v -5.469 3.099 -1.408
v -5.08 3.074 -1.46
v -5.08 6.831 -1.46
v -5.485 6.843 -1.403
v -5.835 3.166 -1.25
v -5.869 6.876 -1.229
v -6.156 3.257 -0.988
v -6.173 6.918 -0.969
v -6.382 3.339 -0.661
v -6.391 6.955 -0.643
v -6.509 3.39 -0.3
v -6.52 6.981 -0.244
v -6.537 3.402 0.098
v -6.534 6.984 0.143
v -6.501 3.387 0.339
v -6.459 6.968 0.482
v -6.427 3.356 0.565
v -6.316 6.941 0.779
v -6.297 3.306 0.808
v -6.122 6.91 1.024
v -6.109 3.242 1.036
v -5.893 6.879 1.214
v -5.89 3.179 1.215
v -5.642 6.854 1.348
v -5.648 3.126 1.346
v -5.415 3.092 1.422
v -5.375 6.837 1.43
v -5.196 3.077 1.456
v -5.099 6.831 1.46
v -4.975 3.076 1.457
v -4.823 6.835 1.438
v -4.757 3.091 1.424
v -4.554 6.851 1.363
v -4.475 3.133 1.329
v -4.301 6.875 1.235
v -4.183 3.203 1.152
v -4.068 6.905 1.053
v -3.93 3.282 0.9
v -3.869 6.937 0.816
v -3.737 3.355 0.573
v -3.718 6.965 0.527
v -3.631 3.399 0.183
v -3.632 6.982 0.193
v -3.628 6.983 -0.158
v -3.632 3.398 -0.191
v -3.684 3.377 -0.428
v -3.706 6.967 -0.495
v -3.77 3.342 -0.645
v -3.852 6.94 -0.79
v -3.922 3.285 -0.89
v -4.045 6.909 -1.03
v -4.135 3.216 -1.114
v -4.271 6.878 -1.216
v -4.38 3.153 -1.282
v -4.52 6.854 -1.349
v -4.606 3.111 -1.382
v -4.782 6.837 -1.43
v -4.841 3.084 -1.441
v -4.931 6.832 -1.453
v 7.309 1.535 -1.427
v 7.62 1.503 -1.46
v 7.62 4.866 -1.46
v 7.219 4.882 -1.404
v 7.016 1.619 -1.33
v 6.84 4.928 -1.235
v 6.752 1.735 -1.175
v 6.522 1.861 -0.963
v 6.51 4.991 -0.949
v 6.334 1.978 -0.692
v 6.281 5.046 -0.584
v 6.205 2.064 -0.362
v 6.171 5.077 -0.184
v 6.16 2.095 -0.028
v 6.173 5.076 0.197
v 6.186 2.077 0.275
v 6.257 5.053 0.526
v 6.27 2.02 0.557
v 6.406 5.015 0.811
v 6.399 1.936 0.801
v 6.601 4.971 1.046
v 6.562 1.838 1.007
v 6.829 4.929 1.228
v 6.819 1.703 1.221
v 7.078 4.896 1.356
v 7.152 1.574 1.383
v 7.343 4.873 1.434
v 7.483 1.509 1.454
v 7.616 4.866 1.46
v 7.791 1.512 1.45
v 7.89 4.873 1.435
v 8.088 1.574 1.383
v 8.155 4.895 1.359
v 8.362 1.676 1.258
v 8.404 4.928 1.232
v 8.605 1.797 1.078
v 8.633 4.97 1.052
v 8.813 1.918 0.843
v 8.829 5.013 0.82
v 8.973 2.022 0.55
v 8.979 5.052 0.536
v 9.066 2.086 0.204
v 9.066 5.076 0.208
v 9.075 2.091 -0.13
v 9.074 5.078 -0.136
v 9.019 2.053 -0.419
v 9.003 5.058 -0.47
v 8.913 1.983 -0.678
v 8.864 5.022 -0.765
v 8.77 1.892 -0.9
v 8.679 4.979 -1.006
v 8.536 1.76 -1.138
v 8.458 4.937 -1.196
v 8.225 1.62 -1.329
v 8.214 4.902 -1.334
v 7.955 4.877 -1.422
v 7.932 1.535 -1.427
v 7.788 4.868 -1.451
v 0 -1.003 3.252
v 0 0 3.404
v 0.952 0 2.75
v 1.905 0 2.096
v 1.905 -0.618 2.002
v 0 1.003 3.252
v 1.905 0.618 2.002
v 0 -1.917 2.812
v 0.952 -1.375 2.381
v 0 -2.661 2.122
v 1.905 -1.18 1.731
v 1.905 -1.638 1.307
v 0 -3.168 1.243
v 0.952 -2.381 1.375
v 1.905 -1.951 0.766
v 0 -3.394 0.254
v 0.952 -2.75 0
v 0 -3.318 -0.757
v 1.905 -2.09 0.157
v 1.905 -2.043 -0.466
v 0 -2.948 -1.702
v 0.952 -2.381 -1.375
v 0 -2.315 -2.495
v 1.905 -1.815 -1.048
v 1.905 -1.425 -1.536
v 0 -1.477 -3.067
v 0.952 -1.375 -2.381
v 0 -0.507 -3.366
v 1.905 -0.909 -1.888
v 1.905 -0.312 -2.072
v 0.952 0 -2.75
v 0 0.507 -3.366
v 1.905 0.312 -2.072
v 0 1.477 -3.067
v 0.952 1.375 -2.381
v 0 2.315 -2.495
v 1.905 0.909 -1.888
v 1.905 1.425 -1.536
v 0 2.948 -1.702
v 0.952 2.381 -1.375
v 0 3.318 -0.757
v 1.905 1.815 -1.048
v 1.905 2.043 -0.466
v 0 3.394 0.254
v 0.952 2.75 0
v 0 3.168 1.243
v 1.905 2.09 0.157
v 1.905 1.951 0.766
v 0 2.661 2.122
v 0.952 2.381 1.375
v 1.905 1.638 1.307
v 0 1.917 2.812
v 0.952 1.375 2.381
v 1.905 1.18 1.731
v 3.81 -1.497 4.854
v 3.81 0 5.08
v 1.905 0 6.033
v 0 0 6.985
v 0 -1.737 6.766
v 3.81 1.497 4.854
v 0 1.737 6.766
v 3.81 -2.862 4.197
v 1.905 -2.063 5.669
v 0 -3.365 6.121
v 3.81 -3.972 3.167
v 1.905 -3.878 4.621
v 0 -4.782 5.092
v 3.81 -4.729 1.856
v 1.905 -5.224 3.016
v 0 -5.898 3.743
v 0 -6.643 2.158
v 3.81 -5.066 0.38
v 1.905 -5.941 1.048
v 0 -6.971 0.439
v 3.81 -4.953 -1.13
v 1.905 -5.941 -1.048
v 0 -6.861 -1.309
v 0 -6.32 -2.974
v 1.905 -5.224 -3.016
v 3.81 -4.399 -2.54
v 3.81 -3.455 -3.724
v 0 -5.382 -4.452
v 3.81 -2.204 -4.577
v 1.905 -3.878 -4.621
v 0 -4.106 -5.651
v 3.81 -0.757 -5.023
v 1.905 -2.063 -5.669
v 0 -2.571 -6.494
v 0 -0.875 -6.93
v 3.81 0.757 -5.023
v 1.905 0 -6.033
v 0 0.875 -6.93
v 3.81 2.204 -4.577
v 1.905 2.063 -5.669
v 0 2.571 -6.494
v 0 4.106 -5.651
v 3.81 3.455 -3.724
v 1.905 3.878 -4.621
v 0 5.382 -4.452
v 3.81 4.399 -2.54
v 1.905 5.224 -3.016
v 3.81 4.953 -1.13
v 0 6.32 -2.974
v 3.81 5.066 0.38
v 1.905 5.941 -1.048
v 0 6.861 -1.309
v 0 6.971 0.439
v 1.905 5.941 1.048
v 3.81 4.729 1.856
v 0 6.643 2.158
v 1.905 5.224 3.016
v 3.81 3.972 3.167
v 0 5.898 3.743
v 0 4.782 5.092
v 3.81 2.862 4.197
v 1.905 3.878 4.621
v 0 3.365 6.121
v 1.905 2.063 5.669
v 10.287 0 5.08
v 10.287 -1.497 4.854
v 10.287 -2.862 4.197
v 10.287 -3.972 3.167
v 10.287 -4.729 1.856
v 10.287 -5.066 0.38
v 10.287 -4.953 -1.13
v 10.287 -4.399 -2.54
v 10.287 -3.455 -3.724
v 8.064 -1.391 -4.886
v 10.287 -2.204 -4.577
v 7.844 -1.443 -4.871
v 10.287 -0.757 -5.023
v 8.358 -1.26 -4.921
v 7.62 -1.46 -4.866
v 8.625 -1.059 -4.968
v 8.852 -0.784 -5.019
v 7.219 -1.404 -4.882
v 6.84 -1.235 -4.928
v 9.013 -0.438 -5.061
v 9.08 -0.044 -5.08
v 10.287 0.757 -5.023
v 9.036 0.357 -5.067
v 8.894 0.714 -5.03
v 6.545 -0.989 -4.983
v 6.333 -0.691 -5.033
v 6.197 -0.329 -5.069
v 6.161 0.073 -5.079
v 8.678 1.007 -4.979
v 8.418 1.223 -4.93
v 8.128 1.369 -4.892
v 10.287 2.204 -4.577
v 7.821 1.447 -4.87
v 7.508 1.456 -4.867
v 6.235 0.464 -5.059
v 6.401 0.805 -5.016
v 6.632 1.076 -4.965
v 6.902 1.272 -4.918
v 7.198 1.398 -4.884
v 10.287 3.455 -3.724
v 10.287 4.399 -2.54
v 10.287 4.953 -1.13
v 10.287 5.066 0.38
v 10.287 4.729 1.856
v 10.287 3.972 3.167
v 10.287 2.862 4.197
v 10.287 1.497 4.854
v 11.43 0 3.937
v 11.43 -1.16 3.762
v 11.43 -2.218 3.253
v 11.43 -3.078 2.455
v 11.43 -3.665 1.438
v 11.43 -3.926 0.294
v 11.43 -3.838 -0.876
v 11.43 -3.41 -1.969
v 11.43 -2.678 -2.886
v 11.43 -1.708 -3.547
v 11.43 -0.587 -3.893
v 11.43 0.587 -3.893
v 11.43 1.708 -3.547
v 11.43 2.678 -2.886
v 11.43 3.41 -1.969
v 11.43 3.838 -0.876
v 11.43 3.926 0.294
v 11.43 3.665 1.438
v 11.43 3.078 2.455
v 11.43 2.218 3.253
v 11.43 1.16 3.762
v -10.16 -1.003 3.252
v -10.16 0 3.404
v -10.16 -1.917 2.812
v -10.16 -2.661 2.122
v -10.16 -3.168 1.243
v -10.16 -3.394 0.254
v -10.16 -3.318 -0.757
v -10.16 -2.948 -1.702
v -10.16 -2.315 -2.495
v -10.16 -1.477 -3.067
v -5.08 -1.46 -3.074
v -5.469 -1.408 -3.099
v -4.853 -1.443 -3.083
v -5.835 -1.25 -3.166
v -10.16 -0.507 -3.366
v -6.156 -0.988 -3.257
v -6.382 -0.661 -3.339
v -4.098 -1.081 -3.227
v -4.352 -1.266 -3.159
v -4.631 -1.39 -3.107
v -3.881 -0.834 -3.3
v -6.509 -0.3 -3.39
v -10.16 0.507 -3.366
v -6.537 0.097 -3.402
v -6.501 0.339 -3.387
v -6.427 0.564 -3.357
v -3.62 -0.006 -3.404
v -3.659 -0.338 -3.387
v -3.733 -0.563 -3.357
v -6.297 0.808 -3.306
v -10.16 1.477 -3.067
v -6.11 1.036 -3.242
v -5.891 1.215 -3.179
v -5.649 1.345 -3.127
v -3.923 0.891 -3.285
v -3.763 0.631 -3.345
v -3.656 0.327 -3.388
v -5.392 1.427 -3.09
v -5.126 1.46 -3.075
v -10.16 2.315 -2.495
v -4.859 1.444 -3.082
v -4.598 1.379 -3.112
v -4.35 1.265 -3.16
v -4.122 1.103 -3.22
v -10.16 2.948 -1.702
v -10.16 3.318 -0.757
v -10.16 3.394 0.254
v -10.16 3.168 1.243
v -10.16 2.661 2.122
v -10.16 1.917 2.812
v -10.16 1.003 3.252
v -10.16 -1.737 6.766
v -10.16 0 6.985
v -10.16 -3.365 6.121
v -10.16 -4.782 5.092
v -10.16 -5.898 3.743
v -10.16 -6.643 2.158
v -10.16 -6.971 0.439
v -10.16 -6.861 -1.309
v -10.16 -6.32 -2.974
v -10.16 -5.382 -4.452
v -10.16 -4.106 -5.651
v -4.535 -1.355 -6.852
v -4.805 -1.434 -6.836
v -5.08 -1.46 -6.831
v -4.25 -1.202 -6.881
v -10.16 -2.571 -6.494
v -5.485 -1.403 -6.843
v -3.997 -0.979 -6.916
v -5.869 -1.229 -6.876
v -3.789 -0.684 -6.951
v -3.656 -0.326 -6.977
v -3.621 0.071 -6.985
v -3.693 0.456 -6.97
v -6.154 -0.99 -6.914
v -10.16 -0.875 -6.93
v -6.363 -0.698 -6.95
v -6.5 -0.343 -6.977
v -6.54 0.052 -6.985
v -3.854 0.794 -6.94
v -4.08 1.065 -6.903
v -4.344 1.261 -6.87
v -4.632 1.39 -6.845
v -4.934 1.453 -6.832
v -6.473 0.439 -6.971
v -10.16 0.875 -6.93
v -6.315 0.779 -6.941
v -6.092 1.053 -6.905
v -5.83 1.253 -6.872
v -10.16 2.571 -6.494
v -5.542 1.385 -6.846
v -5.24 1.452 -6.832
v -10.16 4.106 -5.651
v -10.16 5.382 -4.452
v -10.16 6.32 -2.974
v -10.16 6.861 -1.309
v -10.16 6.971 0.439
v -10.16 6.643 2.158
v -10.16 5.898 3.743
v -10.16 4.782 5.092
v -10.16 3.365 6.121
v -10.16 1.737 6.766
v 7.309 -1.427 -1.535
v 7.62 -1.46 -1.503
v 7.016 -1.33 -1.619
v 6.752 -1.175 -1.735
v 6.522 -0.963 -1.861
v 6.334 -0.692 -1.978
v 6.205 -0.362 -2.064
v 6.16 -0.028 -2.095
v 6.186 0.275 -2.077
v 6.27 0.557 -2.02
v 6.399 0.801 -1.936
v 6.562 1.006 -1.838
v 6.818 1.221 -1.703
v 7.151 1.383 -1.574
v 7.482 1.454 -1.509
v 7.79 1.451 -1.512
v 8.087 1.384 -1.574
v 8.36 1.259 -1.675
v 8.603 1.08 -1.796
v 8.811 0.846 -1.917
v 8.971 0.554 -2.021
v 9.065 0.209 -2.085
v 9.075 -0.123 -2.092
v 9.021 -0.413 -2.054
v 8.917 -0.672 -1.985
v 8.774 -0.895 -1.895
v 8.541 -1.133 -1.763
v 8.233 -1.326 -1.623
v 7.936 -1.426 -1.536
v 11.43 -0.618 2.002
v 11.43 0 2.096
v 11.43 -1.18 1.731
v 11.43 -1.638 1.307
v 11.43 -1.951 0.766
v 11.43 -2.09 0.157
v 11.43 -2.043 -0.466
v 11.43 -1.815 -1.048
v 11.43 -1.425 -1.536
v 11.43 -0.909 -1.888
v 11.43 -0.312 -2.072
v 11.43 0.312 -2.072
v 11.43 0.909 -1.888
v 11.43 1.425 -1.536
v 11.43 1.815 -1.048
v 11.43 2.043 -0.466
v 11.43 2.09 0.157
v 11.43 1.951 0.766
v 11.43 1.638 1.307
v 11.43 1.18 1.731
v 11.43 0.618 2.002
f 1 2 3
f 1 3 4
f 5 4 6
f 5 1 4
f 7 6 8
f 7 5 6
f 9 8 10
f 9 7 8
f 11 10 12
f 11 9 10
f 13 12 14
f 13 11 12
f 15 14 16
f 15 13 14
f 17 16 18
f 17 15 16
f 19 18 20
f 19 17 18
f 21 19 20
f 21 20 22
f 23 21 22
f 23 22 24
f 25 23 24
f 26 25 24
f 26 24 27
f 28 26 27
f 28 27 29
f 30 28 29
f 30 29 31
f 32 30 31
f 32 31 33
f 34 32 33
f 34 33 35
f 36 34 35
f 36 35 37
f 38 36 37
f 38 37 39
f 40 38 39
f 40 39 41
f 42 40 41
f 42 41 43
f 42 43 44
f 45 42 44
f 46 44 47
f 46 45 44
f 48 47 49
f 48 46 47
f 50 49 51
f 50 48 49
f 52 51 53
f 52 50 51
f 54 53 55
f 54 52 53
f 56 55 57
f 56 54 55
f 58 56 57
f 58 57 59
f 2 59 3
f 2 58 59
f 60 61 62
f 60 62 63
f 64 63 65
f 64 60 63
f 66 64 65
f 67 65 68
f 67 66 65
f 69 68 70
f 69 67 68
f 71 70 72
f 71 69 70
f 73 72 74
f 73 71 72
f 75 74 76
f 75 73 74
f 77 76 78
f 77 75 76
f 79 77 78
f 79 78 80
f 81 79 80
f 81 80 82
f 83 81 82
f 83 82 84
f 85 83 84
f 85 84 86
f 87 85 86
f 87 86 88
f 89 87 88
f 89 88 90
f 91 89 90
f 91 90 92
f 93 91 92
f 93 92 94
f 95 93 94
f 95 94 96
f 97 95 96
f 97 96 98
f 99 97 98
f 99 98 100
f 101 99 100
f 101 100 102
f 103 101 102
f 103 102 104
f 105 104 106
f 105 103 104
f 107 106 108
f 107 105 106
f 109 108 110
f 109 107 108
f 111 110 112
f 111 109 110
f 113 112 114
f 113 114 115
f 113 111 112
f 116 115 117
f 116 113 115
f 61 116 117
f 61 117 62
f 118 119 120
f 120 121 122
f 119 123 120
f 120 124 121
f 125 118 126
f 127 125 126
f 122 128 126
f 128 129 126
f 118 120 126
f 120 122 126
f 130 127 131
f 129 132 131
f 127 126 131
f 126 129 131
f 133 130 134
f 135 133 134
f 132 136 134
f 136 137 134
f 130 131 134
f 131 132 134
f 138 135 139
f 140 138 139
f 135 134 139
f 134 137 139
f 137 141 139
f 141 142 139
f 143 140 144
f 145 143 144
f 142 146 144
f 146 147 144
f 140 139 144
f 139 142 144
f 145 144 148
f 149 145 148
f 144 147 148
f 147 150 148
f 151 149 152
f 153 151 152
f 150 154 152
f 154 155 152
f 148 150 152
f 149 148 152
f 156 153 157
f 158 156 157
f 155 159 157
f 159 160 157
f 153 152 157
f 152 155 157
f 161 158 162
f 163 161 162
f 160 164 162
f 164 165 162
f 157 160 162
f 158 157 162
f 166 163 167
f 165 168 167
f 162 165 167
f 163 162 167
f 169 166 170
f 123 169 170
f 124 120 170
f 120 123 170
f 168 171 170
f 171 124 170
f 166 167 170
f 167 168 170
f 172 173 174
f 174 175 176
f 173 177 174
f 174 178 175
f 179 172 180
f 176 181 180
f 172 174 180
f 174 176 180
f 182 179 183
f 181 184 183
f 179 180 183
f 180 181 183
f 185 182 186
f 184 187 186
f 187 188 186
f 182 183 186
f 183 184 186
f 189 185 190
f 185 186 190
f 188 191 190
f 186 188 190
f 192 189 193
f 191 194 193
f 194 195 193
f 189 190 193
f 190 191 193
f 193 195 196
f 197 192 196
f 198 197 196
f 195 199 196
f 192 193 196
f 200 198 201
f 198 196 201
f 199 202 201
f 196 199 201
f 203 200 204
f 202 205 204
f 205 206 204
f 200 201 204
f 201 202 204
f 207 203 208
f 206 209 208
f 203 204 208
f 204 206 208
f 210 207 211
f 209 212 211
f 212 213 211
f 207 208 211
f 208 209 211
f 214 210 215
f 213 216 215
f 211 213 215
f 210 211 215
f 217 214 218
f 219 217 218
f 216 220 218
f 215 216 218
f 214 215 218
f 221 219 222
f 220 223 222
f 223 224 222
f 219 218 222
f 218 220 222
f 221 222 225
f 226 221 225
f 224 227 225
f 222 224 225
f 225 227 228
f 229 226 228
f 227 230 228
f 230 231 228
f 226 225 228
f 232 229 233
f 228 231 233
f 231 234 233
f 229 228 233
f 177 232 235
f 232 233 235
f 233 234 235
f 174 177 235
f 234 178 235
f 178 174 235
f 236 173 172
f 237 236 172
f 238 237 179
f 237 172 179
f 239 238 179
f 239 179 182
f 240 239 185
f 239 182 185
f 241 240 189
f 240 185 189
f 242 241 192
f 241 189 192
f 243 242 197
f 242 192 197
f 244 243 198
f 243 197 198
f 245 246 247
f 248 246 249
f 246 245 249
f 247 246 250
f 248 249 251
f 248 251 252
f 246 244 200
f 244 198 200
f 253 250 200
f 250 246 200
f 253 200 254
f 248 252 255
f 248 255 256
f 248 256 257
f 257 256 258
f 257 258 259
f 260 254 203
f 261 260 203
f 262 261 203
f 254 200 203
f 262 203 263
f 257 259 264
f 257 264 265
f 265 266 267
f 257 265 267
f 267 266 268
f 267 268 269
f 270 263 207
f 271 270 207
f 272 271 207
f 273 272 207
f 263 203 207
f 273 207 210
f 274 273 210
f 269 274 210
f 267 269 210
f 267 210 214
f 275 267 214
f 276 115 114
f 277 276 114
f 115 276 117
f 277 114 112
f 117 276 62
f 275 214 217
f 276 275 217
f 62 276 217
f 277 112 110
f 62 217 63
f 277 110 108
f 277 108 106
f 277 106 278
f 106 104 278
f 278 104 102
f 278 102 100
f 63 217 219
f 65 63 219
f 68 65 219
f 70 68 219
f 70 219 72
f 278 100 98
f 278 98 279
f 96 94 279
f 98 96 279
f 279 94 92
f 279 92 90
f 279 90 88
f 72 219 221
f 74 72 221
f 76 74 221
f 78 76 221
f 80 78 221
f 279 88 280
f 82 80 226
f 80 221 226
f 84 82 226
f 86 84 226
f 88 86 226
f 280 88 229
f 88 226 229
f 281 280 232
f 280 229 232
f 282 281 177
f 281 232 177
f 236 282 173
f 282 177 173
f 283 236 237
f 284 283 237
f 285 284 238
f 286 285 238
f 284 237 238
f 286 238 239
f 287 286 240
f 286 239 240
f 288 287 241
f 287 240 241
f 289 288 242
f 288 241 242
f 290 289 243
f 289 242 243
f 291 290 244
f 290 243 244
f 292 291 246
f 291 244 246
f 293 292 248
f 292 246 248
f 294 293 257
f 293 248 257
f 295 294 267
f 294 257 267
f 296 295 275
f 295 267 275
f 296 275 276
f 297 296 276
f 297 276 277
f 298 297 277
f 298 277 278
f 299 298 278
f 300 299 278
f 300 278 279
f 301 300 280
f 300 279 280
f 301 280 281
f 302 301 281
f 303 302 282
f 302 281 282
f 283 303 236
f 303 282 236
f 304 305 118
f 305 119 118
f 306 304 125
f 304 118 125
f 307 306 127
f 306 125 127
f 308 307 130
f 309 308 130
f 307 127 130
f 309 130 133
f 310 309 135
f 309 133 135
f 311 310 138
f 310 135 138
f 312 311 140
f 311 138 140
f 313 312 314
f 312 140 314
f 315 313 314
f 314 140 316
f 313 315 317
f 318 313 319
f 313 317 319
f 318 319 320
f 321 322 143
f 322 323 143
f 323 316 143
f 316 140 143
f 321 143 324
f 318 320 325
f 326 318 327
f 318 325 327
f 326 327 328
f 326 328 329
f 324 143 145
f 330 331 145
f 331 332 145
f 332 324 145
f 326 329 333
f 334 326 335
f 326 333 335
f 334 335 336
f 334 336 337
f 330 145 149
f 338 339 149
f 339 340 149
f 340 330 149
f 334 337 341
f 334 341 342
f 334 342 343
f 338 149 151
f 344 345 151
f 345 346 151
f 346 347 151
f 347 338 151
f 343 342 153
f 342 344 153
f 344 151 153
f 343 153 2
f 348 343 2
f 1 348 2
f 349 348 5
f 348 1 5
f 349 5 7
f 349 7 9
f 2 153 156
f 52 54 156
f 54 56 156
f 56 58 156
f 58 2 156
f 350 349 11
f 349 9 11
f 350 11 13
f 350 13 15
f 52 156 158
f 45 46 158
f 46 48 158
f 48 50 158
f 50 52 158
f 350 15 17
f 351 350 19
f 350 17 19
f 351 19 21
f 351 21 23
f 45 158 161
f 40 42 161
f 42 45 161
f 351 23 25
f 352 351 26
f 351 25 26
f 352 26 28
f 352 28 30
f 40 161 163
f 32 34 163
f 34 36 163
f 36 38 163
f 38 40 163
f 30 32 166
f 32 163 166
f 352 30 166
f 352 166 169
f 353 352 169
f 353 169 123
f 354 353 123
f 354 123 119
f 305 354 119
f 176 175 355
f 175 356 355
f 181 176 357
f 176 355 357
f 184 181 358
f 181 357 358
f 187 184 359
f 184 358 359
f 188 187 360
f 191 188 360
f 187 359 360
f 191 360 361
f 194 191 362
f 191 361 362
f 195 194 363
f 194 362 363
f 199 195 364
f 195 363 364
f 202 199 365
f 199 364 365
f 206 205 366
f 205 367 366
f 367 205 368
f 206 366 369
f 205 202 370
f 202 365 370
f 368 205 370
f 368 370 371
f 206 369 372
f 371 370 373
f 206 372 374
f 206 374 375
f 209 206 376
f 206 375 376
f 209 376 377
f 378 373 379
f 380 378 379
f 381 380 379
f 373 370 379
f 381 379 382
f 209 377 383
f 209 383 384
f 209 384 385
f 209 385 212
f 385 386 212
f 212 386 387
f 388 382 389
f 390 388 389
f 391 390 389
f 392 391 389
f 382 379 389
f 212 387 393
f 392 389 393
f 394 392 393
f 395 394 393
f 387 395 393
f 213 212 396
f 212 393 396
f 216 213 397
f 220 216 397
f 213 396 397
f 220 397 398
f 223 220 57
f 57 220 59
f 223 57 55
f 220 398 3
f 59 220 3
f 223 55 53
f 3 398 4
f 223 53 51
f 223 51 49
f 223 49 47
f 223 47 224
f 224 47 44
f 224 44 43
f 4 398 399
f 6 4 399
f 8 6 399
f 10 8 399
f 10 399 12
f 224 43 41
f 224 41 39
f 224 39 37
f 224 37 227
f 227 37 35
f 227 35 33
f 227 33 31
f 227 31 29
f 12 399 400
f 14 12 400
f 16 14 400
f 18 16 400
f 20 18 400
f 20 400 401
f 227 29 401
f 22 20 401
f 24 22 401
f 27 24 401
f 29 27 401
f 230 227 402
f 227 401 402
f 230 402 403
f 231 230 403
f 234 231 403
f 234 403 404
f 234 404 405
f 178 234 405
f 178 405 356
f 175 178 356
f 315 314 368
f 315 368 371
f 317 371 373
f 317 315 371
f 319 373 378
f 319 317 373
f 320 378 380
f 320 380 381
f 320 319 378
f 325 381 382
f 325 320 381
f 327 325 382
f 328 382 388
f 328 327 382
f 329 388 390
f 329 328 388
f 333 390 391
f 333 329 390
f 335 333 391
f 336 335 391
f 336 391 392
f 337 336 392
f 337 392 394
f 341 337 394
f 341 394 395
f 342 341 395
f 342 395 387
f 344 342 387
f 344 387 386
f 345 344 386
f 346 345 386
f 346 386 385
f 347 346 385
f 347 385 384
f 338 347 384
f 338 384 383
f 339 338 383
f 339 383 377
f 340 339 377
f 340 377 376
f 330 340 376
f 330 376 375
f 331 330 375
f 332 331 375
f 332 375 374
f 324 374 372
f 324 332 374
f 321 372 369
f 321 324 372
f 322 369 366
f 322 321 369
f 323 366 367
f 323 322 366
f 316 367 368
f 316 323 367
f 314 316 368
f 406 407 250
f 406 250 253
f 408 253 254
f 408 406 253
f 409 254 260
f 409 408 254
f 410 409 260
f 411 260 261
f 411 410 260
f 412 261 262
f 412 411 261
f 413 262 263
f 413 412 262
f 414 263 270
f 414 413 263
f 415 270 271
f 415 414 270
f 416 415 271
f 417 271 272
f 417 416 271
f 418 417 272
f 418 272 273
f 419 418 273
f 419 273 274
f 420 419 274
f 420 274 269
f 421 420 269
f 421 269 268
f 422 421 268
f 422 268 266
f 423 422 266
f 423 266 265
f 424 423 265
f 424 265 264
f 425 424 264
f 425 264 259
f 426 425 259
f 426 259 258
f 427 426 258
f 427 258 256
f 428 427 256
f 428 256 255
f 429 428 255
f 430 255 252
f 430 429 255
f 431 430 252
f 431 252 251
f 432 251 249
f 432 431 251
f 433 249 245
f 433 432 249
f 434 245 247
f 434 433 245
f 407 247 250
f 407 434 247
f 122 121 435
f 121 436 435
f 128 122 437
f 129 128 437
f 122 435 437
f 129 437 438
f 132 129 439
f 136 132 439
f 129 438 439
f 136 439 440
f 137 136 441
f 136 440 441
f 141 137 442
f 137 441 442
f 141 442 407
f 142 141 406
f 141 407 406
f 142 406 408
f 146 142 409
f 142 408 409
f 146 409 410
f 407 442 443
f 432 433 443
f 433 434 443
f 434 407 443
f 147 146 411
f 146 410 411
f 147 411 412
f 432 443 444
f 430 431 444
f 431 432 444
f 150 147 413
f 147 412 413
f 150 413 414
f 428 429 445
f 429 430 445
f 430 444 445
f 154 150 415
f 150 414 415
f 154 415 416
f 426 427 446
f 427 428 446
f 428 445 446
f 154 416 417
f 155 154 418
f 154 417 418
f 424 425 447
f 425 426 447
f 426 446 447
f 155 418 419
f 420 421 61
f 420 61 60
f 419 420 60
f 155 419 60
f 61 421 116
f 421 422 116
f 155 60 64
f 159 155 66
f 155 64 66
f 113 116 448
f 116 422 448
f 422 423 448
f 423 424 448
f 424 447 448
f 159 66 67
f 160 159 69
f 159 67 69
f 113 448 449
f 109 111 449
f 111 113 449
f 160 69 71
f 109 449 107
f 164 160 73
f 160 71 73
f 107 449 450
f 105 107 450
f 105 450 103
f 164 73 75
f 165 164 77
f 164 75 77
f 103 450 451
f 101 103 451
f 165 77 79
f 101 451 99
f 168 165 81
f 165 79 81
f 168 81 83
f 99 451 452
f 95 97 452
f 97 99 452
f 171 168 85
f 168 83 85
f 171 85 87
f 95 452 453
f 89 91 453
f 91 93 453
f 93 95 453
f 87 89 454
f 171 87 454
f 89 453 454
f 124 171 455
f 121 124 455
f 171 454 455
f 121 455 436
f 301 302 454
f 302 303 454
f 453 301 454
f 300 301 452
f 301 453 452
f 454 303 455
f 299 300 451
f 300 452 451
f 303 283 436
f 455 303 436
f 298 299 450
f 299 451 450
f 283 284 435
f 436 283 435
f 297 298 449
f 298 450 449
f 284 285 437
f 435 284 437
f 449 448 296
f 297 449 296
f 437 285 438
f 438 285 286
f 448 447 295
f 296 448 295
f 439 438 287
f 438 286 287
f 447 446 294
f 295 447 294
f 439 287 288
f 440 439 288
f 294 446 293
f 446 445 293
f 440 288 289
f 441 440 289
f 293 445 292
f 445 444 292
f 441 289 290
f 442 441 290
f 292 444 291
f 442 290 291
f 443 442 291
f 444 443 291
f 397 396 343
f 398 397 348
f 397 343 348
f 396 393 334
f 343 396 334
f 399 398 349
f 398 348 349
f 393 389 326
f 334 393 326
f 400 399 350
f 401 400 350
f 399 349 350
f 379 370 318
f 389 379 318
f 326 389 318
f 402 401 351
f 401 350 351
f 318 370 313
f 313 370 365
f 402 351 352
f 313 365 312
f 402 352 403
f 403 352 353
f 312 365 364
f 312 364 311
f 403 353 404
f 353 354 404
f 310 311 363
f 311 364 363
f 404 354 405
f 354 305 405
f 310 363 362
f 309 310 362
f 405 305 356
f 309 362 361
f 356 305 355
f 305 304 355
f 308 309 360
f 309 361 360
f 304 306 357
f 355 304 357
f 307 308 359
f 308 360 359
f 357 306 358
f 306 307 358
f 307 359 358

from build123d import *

# Parameters (mm, degrees)
SKETCH2_R          = 1.4605
CUT_EXTRUDE1_DEPTH = 16.107129112
CIRPATTERN1_COUNT  = 2
CIRPATTERN1_ANGLE  = 90
CHAMFER1_SIZE      = 1.143


with BuildPart() as part:
    # Sketch1 → Revolve1 (revolve)
    with BuildSketch(Plane(origin=(0, 0, 0), x_dir=(1, 0, 0), z_dir=(0, 1, 0)), mode=Mode.PRIVATE) as revolve1_sk:
        Polygon((-10.16, 3.4036), (0, 3.4036), (1.905, 2.0955), (11.43, 2.0955), (11.43, 5.08), (3.81, 5.08), (0, 6.985), (-10.16, 6.985), align=None)
    revolve(revolve1_sk.sketch.rotate(Axis((0, 0, 0), (1, 0, 0)), 180), axis=Axis((0, 0, 0), (1, 0, 0)))

    # Sketch2 → Cut-Extrude1 (cut, through all)
    with BuildSketch(Plane(origin=(0, 0, 0), x_dir=(1, 0, 0), z_dir=(0, 1, 0))):
        with Locations(Location((-5.08, 0, 0), (0, 0, 90))):
            Circle(SKETCH2_R)
        with Locations(Location((7.62, 0, 0), (0, 0, 90))):
            Circle(SKETCH2_R)
    cut_extrude1 = extrude(amount=CUT_EXTRUDE1_DEPTH, mode=Mode.SUBTRACT)

    # CirPattern1: Cut-Extrude1 ×2 about axis
    cirpattern1_axis = Axis((-10.16, 0, 0), (-1, 0, 0))
    for i in range(1, CIRPATTERN1_COUNT):
        add(cut_extrude1.rotate(cirpattern1_axis, i * CIRPATTERN1_ANGLE / (CIRPATTERN1_COUNT - 1)), mode=Mode.SUBTRACT)

    # Chamfer1
    chamfer1_edges = [part.edges().sort_by_distance(p)[0] for p in [
        (11.43, 0, -5.08),
    ]]
    chamfer(chamfer1_edges, length=CHAMFER1_SIZE)


solid = part.part
